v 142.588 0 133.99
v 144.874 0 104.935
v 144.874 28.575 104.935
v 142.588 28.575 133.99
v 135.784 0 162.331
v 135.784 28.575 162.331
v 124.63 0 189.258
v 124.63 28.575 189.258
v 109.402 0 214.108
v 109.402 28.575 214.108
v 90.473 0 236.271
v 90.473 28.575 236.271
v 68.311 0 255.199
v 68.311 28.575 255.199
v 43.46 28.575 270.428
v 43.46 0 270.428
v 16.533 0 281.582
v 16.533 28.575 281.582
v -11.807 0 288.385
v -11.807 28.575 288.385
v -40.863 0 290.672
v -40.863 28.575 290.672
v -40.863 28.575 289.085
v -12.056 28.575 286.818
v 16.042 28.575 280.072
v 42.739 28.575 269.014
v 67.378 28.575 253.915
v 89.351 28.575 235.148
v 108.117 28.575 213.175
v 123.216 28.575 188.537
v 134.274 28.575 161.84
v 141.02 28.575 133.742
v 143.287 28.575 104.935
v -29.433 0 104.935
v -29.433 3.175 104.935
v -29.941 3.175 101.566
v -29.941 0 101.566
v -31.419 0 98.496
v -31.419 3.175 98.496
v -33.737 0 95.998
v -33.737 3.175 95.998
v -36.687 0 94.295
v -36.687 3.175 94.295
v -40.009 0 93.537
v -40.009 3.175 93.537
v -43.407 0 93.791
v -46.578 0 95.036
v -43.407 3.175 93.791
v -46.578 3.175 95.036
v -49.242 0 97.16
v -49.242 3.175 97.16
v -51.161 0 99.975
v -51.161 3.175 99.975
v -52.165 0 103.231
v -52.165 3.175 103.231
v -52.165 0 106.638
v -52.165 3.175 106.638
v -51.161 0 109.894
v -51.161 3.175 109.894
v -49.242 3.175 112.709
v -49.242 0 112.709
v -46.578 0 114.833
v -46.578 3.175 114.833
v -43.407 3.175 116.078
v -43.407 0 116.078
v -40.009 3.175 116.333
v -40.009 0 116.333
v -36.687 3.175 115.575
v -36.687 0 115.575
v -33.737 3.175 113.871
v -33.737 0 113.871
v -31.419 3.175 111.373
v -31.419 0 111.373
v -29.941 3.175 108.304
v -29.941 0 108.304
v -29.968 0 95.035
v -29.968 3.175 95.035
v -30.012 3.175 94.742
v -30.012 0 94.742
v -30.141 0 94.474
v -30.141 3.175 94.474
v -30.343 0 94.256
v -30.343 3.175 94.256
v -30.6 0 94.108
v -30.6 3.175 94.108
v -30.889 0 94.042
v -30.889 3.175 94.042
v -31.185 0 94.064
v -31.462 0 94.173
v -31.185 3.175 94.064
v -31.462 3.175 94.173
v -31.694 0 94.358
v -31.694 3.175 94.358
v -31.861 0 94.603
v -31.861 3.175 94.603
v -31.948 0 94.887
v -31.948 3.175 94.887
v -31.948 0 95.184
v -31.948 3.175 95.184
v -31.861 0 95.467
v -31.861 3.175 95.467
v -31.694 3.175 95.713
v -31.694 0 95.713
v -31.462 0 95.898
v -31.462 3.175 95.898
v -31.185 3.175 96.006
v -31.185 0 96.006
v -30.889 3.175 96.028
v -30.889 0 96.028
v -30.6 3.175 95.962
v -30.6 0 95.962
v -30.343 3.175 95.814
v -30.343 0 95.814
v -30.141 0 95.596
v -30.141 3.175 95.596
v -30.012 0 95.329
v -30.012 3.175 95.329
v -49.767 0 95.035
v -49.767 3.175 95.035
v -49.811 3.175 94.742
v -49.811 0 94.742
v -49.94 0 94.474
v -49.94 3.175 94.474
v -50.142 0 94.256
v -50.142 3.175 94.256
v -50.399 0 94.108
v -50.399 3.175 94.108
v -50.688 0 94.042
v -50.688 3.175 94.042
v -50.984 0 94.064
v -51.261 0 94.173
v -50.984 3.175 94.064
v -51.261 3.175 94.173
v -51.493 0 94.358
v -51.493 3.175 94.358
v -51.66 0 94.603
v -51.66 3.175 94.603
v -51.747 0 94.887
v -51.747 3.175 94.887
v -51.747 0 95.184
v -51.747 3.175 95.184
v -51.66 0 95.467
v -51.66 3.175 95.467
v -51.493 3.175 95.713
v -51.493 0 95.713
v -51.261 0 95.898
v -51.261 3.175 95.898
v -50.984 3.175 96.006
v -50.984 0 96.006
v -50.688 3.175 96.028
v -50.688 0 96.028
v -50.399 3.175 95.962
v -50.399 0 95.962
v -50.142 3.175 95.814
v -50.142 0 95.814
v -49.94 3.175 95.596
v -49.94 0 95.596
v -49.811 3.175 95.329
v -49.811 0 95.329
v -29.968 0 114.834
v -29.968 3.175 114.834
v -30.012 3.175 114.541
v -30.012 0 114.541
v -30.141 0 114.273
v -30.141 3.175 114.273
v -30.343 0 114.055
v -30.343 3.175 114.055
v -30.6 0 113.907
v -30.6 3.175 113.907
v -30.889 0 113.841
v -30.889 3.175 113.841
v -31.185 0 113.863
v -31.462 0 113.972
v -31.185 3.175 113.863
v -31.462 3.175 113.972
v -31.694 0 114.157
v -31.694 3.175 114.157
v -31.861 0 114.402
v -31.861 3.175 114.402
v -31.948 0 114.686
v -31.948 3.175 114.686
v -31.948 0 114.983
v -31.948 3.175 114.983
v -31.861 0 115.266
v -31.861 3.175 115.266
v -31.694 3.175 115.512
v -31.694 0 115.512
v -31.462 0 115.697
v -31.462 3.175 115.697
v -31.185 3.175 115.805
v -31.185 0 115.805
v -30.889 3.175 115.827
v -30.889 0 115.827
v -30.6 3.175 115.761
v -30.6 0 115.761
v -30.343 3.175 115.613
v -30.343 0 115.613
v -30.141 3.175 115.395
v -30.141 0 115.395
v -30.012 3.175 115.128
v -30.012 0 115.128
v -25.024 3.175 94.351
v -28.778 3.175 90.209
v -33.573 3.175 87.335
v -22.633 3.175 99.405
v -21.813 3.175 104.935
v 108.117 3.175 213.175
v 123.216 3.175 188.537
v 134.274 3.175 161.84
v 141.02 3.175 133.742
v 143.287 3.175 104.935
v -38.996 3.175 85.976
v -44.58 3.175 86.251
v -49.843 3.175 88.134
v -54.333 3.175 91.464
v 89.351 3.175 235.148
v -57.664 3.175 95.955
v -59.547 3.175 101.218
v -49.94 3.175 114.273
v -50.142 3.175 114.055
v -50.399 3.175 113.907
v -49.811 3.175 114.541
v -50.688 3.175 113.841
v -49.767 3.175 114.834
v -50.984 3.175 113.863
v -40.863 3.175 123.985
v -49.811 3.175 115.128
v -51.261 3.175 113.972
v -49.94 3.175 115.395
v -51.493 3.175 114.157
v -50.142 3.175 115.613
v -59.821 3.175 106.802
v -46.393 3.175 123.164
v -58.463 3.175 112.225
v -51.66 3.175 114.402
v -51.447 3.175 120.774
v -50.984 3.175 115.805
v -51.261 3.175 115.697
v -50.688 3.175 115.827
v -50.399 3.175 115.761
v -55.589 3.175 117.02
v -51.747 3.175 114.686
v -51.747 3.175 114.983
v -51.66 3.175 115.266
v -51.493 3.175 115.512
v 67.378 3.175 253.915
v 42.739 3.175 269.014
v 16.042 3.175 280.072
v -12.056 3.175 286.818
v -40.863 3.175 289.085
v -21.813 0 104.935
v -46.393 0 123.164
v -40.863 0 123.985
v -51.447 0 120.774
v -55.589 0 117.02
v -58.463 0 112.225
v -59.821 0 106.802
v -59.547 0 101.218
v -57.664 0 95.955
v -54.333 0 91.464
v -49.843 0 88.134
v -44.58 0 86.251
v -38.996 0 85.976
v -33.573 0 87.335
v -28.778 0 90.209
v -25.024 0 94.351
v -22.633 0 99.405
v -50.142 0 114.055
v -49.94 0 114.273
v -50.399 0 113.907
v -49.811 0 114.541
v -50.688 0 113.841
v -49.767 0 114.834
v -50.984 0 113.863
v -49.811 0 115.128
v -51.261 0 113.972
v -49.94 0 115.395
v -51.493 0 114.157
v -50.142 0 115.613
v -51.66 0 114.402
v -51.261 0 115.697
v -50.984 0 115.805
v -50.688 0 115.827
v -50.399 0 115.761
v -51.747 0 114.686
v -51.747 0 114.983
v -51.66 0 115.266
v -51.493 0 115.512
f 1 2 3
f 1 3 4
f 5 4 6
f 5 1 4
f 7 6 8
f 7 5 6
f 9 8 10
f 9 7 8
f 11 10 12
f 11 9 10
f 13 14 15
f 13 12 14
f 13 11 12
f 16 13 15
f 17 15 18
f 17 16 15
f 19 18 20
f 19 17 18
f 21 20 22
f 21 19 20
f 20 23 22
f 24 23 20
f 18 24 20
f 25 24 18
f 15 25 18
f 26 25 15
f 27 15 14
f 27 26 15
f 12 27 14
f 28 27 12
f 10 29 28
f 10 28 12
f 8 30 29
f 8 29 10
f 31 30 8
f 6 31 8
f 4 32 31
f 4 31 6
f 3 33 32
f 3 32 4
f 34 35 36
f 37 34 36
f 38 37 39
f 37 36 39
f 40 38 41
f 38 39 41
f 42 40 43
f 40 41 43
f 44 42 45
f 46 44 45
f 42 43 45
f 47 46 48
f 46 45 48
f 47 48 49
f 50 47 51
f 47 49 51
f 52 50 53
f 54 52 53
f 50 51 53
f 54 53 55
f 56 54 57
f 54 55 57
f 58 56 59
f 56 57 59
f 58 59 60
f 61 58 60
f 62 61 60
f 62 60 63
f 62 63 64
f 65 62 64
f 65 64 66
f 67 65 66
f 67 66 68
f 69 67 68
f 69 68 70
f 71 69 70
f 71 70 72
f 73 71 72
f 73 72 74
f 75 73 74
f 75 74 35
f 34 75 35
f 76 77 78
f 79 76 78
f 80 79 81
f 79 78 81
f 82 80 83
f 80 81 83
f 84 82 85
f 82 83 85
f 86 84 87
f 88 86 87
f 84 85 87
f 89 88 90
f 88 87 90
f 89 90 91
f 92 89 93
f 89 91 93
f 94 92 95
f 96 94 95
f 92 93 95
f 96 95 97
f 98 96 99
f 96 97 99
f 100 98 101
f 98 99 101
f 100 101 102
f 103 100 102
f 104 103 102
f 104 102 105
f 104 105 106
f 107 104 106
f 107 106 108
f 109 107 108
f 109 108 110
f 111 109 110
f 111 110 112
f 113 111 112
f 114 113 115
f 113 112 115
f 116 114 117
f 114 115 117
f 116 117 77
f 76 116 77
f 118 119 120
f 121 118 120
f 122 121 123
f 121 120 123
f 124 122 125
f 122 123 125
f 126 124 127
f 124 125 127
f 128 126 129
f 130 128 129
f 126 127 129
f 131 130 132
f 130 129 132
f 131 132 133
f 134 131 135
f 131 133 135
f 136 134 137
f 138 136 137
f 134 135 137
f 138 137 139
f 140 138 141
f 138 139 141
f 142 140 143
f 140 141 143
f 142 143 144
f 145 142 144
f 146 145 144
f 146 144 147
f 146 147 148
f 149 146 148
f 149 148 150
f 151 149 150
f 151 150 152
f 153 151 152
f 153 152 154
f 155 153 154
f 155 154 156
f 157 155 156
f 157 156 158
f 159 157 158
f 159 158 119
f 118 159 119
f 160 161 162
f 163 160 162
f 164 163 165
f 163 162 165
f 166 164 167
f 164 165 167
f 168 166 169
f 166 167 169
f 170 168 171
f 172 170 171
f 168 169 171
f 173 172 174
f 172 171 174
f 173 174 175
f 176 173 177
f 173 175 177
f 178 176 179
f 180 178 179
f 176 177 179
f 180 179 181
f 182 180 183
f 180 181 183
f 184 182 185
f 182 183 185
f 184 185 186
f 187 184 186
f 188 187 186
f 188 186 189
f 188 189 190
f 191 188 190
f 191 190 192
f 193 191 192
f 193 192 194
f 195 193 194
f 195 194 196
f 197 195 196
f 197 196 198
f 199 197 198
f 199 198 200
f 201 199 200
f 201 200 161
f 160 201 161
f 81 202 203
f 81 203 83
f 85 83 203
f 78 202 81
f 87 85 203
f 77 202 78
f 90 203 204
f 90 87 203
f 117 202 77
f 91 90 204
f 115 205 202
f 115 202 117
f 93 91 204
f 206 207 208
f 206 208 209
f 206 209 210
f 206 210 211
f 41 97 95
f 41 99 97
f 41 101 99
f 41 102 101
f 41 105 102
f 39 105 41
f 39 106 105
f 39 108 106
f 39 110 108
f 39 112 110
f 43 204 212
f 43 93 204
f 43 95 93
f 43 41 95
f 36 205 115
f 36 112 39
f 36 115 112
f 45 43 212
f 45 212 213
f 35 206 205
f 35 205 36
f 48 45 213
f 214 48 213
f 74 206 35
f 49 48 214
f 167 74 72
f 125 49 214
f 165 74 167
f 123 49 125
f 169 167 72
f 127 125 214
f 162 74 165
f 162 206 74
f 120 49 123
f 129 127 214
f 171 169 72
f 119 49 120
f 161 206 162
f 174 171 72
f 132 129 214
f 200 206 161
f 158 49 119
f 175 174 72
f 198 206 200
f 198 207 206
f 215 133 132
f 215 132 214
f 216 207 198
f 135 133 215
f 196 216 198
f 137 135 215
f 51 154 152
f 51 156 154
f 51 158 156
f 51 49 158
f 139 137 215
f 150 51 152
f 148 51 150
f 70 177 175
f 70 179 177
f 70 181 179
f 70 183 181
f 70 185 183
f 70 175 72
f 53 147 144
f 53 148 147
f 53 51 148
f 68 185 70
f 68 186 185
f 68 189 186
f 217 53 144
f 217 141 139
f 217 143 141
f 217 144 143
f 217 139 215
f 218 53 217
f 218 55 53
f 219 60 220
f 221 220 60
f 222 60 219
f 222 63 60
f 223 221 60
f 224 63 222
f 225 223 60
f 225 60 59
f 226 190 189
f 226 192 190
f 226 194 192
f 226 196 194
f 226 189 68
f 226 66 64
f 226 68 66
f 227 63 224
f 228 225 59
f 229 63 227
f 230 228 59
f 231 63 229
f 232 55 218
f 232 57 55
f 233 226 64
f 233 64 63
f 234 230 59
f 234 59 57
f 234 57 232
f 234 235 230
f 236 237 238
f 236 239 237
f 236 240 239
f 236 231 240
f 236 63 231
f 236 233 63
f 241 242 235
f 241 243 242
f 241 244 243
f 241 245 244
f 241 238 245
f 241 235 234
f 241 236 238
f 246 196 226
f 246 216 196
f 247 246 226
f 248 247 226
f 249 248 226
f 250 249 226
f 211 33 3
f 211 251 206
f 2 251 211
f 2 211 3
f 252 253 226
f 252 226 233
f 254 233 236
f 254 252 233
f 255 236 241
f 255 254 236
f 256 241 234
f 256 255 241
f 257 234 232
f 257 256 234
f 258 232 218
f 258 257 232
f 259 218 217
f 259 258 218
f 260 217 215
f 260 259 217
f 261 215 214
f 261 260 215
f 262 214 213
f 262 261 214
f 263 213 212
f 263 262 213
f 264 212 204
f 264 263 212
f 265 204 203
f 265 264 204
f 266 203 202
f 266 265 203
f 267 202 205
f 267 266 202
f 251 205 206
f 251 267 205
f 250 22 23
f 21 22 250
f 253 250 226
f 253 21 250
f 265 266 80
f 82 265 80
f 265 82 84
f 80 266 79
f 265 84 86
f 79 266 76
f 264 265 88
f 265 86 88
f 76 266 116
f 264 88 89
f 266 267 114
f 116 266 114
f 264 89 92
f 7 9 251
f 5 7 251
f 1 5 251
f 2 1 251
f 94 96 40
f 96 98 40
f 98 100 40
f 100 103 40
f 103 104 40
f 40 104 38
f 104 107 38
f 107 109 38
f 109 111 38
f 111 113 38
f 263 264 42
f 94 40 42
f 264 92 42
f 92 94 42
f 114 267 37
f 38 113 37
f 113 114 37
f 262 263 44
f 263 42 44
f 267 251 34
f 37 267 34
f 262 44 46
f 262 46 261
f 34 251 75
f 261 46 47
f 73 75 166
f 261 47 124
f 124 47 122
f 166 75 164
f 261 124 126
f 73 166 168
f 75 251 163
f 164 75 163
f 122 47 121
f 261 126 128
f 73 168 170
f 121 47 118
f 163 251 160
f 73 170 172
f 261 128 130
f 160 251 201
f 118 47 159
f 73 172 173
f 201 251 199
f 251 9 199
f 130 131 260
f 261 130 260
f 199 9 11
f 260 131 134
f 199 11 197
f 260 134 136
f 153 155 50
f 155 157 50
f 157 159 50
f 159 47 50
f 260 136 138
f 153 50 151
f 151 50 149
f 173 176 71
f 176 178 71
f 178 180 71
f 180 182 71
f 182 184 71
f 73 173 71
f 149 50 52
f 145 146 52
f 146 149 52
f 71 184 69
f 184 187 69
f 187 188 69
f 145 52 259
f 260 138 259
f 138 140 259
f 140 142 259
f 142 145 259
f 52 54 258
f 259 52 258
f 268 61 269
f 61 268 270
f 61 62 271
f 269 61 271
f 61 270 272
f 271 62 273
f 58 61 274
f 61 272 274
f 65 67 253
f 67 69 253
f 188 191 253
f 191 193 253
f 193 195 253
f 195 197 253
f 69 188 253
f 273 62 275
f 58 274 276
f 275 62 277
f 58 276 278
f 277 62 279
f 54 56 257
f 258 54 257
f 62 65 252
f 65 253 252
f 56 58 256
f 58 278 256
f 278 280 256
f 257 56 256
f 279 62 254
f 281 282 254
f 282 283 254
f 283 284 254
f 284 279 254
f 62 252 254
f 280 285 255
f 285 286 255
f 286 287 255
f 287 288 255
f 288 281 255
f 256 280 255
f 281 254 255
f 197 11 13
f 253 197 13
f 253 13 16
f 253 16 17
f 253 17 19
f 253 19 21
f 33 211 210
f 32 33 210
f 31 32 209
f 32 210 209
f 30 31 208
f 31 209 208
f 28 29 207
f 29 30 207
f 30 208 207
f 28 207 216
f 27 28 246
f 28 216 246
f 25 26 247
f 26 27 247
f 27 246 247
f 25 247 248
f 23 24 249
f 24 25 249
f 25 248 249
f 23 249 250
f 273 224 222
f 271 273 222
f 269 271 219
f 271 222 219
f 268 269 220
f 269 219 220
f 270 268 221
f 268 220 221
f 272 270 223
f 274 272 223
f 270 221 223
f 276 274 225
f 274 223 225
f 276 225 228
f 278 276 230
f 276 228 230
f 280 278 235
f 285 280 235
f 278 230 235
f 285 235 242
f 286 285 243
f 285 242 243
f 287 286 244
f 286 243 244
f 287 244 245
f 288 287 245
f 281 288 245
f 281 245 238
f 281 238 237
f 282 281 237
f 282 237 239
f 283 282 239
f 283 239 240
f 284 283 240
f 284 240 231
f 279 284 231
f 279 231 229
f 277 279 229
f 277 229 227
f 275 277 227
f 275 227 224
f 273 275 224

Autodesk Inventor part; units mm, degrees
ref_plane "YZ Plane" through (0, 0, 0) normal (1, 0, 0) x (0, 1, 0)
ref_plane "XZ Plane" through (0, 0, 0) normal (0, 1, 0) x (-1, 0, 0)
ref_plane "XY Plane" through (0, 0, 0) normal (0, 0, 1) x (1, 0, 0)
sketch "Sketch1" plane through (0, 0, 0) normal (0, 1, 0) x (-1, 0, 0)
  arc A0 (40.8631, 289.0847) -> (-143.2869, 104.9347) centre (40.8631, 104.9347) ccw
  line L0 (21.8131, 104.9347) -> (-143.2869, 104.9347)
  line L1 (40.8631, 289.0847) -> (40.8631, 123.9847)
  arc A1 (21.8131, 104.9347) -> (40.8631, 123.9847) centre (40.8631, 104.9347) ccw
  point P0 (0, 0)
  dimension "d0" = 368.3
  dimension "d2" = 0
  dimension "d3" = 38.1
extrude "Extrusion1" add sketch "Sketch1" along normal blind 3.175
sketch "Sketch2" plane through (0, 3.175, 0) normal (0, 1, 0) x (1, 0, 0)
  circle A0 centre (-30.9636, -95.0352) radius 1.25 projected
  circle A1 centre (-30.9636, -114.8342) radius 1.25 projected
  circle A2 centre (-50.7626, -114.8342) radius 1.25 projected
  circle A3 centre (-50.7626, -95.0352) radius 1.25 projected
  circle A4 centre (-50.7626, -114.8342) radius 0.996
  circle A5 centre (-30.9636, -114.8342) radius 0.996
  circle A6 centre (-30.9636, -95.0352) radius 0.996
  circle A7 centre (-50.7626, -95.0352) radius 0.996
  arc A8 (-21.8131, -104.9347) -> (-40.8631, -123.9847) centre (-40.8631, -104.9347) ccw projected
  circle A9 centre (-40.8631, -104.9347) radius 11.43
  point P0 (0, 0)
  dimension "d6" = 2.5
  dimension "d7" = 1.992
  dimension "d8" = 1.992
  dimension "d9" = 1.992
  dimension "d10" = 1.992
  dimension "d11" = 22.86
extrude "Extrusion2" cut sketch "Sketch2" against normal blind 3.175 contours A4 | A5 | A6 | A7 | A9
sketch "Sketch3" plane through (0, 3.175, 0) normal (0, 1, 0) x (1, 0, 0)
  arc A0 (-40.8631, -289.0847) -> (143.2869, -104.9347) centre (-40.8631, -104.9347) ccw projected
  circle A1 centre (-40.8631, -104.9347) radius 185.7375
  line L0 (143.2869, -104.9347) -> (144.8744, -104.9347)
  line L1 (-40.8631, -123.9847) -> (-40.8631, -289.0847) projected
  line L2 (-40.8631, -289.0847) -> (-40.8631, -290.6722)
  point P0 (0, 0)
  dimension "d14" = 184.15
  dimension "d15" = 371.475
extrude "Extrusion3" add sketch "Sketch3" along normal blind 25.4 and the other way blind 3.175 contours A0 L0 A1 L2 picked at (143.7515, -117.0198)
properties part number "ramp"
